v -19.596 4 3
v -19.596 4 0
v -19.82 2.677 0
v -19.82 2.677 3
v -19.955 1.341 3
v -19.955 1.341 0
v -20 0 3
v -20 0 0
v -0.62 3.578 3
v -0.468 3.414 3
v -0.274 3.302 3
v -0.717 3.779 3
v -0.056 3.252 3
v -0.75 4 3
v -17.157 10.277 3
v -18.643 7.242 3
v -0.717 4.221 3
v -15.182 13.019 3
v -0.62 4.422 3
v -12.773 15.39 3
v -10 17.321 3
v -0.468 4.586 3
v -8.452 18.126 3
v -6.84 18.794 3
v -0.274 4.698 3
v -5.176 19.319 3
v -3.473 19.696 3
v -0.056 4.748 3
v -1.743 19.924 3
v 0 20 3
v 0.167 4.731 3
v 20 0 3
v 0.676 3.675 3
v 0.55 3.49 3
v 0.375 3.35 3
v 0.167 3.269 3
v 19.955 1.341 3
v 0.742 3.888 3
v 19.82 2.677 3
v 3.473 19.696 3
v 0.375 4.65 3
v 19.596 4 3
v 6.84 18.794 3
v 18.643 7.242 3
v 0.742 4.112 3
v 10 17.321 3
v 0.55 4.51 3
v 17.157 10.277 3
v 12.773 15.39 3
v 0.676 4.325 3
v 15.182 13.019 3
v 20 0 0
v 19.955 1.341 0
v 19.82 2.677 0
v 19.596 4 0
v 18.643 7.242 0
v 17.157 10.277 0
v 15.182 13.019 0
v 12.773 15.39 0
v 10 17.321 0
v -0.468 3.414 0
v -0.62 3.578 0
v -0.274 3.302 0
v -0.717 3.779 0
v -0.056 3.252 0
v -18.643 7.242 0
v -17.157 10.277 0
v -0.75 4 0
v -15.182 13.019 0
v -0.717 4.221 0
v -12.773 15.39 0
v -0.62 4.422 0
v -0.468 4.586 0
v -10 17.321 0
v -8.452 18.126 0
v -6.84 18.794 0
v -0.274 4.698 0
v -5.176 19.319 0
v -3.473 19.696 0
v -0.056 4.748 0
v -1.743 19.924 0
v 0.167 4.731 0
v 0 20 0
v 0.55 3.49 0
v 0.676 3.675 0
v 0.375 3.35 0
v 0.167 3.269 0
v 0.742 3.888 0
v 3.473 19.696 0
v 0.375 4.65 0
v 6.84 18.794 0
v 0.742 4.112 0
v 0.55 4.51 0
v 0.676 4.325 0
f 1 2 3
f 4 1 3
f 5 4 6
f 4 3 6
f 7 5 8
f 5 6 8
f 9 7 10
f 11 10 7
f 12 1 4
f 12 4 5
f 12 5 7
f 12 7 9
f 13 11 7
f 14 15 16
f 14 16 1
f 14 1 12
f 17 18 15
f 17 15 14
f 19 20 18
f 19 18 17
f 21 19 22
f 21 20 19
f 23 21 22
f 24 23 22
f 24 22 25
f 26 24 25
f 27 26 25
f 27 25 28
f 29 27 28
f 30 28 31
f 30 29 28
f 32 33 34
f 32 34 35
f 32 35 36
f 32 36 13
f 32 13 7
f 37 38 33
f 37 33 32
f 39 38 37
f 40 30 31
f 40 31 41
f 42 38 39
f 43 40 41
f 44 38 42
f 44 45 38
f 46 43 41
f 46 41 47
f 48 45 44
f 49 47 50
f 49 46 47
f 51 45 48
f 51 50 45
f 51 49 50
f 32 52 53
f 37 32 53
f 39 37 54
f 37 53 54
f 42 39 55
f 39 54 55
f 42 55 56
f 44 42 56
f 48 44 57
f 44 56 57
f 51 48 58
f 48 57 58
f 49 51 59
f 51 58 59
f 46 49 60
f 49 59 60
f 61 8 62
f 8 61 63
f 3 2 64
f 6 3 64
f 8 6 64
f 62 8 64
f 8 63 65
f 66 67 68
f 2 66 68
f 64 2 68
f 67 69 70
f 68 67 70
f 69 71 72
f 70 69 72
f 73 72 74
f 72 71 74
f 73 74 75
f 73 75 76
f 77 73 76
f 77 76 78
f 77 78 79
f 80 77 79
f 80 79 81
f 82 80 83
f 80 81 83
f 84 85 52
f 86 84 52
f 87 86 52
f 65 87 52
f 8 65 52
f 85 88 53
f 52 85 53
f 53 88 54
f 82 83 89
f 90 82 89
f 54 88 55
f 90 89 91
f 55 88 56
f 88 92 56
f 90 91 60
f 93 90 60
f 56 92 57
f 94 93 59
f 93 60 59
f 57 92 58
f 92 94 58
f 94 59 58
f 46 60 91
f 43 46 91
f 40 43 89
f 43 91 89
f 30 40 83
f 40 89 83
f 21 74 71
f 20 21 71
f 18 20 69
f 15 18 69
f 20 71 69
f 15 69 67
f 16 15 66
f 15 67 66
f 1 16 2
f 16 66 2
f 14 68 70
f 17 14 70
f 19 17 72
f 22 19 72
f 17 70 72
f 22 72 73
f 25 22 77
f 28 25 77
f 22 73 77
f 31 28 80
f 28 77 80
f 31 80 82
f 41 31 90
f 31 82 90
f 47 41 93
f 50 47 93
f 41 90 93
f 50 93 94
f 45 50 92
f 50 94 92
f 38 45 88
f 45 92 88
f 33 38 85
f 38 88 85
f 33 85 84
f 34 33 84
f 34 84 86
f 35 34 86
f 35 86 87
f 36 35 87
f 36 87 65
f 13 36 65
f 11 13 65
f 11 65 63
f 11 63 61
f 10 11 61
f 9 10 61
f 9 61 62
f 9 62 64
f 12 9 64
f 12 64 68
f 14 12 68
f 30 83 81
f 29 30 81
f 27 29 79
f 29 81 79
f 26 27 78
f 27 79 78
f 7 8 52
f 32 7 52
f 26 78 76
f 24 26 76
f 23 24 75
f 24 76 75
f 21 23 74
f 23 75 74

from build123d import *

# Parameters (mm, degrees)
BOSS_EXTRUDE1_DEPTH   = 3
F_1_5MM_DOWEL_HOLE1_D = 1.5


with BuildPart() as part:
    # Sketch1-disc_sketch<2> → Boss-Extrude1 (new body)
    with BuildSketch(Plane.XY):
        with BuildLine():
            ThreePointArc((20, 0), (0, 20), (-20, 0))
            Line((-20, 0), (20, 0))
        make_face()
    extrude(amount=BOSS_EXTRUDE1_DEPTH)

    # Ø1.5mm Dowel Hole1 (through all)
    with Locations(Plane.XY.offset(3)):
        with Locations((0, 4)):
            Hole(F_1_5MM_DOWEL_HOLE1_D / 2)


solid = part.part
